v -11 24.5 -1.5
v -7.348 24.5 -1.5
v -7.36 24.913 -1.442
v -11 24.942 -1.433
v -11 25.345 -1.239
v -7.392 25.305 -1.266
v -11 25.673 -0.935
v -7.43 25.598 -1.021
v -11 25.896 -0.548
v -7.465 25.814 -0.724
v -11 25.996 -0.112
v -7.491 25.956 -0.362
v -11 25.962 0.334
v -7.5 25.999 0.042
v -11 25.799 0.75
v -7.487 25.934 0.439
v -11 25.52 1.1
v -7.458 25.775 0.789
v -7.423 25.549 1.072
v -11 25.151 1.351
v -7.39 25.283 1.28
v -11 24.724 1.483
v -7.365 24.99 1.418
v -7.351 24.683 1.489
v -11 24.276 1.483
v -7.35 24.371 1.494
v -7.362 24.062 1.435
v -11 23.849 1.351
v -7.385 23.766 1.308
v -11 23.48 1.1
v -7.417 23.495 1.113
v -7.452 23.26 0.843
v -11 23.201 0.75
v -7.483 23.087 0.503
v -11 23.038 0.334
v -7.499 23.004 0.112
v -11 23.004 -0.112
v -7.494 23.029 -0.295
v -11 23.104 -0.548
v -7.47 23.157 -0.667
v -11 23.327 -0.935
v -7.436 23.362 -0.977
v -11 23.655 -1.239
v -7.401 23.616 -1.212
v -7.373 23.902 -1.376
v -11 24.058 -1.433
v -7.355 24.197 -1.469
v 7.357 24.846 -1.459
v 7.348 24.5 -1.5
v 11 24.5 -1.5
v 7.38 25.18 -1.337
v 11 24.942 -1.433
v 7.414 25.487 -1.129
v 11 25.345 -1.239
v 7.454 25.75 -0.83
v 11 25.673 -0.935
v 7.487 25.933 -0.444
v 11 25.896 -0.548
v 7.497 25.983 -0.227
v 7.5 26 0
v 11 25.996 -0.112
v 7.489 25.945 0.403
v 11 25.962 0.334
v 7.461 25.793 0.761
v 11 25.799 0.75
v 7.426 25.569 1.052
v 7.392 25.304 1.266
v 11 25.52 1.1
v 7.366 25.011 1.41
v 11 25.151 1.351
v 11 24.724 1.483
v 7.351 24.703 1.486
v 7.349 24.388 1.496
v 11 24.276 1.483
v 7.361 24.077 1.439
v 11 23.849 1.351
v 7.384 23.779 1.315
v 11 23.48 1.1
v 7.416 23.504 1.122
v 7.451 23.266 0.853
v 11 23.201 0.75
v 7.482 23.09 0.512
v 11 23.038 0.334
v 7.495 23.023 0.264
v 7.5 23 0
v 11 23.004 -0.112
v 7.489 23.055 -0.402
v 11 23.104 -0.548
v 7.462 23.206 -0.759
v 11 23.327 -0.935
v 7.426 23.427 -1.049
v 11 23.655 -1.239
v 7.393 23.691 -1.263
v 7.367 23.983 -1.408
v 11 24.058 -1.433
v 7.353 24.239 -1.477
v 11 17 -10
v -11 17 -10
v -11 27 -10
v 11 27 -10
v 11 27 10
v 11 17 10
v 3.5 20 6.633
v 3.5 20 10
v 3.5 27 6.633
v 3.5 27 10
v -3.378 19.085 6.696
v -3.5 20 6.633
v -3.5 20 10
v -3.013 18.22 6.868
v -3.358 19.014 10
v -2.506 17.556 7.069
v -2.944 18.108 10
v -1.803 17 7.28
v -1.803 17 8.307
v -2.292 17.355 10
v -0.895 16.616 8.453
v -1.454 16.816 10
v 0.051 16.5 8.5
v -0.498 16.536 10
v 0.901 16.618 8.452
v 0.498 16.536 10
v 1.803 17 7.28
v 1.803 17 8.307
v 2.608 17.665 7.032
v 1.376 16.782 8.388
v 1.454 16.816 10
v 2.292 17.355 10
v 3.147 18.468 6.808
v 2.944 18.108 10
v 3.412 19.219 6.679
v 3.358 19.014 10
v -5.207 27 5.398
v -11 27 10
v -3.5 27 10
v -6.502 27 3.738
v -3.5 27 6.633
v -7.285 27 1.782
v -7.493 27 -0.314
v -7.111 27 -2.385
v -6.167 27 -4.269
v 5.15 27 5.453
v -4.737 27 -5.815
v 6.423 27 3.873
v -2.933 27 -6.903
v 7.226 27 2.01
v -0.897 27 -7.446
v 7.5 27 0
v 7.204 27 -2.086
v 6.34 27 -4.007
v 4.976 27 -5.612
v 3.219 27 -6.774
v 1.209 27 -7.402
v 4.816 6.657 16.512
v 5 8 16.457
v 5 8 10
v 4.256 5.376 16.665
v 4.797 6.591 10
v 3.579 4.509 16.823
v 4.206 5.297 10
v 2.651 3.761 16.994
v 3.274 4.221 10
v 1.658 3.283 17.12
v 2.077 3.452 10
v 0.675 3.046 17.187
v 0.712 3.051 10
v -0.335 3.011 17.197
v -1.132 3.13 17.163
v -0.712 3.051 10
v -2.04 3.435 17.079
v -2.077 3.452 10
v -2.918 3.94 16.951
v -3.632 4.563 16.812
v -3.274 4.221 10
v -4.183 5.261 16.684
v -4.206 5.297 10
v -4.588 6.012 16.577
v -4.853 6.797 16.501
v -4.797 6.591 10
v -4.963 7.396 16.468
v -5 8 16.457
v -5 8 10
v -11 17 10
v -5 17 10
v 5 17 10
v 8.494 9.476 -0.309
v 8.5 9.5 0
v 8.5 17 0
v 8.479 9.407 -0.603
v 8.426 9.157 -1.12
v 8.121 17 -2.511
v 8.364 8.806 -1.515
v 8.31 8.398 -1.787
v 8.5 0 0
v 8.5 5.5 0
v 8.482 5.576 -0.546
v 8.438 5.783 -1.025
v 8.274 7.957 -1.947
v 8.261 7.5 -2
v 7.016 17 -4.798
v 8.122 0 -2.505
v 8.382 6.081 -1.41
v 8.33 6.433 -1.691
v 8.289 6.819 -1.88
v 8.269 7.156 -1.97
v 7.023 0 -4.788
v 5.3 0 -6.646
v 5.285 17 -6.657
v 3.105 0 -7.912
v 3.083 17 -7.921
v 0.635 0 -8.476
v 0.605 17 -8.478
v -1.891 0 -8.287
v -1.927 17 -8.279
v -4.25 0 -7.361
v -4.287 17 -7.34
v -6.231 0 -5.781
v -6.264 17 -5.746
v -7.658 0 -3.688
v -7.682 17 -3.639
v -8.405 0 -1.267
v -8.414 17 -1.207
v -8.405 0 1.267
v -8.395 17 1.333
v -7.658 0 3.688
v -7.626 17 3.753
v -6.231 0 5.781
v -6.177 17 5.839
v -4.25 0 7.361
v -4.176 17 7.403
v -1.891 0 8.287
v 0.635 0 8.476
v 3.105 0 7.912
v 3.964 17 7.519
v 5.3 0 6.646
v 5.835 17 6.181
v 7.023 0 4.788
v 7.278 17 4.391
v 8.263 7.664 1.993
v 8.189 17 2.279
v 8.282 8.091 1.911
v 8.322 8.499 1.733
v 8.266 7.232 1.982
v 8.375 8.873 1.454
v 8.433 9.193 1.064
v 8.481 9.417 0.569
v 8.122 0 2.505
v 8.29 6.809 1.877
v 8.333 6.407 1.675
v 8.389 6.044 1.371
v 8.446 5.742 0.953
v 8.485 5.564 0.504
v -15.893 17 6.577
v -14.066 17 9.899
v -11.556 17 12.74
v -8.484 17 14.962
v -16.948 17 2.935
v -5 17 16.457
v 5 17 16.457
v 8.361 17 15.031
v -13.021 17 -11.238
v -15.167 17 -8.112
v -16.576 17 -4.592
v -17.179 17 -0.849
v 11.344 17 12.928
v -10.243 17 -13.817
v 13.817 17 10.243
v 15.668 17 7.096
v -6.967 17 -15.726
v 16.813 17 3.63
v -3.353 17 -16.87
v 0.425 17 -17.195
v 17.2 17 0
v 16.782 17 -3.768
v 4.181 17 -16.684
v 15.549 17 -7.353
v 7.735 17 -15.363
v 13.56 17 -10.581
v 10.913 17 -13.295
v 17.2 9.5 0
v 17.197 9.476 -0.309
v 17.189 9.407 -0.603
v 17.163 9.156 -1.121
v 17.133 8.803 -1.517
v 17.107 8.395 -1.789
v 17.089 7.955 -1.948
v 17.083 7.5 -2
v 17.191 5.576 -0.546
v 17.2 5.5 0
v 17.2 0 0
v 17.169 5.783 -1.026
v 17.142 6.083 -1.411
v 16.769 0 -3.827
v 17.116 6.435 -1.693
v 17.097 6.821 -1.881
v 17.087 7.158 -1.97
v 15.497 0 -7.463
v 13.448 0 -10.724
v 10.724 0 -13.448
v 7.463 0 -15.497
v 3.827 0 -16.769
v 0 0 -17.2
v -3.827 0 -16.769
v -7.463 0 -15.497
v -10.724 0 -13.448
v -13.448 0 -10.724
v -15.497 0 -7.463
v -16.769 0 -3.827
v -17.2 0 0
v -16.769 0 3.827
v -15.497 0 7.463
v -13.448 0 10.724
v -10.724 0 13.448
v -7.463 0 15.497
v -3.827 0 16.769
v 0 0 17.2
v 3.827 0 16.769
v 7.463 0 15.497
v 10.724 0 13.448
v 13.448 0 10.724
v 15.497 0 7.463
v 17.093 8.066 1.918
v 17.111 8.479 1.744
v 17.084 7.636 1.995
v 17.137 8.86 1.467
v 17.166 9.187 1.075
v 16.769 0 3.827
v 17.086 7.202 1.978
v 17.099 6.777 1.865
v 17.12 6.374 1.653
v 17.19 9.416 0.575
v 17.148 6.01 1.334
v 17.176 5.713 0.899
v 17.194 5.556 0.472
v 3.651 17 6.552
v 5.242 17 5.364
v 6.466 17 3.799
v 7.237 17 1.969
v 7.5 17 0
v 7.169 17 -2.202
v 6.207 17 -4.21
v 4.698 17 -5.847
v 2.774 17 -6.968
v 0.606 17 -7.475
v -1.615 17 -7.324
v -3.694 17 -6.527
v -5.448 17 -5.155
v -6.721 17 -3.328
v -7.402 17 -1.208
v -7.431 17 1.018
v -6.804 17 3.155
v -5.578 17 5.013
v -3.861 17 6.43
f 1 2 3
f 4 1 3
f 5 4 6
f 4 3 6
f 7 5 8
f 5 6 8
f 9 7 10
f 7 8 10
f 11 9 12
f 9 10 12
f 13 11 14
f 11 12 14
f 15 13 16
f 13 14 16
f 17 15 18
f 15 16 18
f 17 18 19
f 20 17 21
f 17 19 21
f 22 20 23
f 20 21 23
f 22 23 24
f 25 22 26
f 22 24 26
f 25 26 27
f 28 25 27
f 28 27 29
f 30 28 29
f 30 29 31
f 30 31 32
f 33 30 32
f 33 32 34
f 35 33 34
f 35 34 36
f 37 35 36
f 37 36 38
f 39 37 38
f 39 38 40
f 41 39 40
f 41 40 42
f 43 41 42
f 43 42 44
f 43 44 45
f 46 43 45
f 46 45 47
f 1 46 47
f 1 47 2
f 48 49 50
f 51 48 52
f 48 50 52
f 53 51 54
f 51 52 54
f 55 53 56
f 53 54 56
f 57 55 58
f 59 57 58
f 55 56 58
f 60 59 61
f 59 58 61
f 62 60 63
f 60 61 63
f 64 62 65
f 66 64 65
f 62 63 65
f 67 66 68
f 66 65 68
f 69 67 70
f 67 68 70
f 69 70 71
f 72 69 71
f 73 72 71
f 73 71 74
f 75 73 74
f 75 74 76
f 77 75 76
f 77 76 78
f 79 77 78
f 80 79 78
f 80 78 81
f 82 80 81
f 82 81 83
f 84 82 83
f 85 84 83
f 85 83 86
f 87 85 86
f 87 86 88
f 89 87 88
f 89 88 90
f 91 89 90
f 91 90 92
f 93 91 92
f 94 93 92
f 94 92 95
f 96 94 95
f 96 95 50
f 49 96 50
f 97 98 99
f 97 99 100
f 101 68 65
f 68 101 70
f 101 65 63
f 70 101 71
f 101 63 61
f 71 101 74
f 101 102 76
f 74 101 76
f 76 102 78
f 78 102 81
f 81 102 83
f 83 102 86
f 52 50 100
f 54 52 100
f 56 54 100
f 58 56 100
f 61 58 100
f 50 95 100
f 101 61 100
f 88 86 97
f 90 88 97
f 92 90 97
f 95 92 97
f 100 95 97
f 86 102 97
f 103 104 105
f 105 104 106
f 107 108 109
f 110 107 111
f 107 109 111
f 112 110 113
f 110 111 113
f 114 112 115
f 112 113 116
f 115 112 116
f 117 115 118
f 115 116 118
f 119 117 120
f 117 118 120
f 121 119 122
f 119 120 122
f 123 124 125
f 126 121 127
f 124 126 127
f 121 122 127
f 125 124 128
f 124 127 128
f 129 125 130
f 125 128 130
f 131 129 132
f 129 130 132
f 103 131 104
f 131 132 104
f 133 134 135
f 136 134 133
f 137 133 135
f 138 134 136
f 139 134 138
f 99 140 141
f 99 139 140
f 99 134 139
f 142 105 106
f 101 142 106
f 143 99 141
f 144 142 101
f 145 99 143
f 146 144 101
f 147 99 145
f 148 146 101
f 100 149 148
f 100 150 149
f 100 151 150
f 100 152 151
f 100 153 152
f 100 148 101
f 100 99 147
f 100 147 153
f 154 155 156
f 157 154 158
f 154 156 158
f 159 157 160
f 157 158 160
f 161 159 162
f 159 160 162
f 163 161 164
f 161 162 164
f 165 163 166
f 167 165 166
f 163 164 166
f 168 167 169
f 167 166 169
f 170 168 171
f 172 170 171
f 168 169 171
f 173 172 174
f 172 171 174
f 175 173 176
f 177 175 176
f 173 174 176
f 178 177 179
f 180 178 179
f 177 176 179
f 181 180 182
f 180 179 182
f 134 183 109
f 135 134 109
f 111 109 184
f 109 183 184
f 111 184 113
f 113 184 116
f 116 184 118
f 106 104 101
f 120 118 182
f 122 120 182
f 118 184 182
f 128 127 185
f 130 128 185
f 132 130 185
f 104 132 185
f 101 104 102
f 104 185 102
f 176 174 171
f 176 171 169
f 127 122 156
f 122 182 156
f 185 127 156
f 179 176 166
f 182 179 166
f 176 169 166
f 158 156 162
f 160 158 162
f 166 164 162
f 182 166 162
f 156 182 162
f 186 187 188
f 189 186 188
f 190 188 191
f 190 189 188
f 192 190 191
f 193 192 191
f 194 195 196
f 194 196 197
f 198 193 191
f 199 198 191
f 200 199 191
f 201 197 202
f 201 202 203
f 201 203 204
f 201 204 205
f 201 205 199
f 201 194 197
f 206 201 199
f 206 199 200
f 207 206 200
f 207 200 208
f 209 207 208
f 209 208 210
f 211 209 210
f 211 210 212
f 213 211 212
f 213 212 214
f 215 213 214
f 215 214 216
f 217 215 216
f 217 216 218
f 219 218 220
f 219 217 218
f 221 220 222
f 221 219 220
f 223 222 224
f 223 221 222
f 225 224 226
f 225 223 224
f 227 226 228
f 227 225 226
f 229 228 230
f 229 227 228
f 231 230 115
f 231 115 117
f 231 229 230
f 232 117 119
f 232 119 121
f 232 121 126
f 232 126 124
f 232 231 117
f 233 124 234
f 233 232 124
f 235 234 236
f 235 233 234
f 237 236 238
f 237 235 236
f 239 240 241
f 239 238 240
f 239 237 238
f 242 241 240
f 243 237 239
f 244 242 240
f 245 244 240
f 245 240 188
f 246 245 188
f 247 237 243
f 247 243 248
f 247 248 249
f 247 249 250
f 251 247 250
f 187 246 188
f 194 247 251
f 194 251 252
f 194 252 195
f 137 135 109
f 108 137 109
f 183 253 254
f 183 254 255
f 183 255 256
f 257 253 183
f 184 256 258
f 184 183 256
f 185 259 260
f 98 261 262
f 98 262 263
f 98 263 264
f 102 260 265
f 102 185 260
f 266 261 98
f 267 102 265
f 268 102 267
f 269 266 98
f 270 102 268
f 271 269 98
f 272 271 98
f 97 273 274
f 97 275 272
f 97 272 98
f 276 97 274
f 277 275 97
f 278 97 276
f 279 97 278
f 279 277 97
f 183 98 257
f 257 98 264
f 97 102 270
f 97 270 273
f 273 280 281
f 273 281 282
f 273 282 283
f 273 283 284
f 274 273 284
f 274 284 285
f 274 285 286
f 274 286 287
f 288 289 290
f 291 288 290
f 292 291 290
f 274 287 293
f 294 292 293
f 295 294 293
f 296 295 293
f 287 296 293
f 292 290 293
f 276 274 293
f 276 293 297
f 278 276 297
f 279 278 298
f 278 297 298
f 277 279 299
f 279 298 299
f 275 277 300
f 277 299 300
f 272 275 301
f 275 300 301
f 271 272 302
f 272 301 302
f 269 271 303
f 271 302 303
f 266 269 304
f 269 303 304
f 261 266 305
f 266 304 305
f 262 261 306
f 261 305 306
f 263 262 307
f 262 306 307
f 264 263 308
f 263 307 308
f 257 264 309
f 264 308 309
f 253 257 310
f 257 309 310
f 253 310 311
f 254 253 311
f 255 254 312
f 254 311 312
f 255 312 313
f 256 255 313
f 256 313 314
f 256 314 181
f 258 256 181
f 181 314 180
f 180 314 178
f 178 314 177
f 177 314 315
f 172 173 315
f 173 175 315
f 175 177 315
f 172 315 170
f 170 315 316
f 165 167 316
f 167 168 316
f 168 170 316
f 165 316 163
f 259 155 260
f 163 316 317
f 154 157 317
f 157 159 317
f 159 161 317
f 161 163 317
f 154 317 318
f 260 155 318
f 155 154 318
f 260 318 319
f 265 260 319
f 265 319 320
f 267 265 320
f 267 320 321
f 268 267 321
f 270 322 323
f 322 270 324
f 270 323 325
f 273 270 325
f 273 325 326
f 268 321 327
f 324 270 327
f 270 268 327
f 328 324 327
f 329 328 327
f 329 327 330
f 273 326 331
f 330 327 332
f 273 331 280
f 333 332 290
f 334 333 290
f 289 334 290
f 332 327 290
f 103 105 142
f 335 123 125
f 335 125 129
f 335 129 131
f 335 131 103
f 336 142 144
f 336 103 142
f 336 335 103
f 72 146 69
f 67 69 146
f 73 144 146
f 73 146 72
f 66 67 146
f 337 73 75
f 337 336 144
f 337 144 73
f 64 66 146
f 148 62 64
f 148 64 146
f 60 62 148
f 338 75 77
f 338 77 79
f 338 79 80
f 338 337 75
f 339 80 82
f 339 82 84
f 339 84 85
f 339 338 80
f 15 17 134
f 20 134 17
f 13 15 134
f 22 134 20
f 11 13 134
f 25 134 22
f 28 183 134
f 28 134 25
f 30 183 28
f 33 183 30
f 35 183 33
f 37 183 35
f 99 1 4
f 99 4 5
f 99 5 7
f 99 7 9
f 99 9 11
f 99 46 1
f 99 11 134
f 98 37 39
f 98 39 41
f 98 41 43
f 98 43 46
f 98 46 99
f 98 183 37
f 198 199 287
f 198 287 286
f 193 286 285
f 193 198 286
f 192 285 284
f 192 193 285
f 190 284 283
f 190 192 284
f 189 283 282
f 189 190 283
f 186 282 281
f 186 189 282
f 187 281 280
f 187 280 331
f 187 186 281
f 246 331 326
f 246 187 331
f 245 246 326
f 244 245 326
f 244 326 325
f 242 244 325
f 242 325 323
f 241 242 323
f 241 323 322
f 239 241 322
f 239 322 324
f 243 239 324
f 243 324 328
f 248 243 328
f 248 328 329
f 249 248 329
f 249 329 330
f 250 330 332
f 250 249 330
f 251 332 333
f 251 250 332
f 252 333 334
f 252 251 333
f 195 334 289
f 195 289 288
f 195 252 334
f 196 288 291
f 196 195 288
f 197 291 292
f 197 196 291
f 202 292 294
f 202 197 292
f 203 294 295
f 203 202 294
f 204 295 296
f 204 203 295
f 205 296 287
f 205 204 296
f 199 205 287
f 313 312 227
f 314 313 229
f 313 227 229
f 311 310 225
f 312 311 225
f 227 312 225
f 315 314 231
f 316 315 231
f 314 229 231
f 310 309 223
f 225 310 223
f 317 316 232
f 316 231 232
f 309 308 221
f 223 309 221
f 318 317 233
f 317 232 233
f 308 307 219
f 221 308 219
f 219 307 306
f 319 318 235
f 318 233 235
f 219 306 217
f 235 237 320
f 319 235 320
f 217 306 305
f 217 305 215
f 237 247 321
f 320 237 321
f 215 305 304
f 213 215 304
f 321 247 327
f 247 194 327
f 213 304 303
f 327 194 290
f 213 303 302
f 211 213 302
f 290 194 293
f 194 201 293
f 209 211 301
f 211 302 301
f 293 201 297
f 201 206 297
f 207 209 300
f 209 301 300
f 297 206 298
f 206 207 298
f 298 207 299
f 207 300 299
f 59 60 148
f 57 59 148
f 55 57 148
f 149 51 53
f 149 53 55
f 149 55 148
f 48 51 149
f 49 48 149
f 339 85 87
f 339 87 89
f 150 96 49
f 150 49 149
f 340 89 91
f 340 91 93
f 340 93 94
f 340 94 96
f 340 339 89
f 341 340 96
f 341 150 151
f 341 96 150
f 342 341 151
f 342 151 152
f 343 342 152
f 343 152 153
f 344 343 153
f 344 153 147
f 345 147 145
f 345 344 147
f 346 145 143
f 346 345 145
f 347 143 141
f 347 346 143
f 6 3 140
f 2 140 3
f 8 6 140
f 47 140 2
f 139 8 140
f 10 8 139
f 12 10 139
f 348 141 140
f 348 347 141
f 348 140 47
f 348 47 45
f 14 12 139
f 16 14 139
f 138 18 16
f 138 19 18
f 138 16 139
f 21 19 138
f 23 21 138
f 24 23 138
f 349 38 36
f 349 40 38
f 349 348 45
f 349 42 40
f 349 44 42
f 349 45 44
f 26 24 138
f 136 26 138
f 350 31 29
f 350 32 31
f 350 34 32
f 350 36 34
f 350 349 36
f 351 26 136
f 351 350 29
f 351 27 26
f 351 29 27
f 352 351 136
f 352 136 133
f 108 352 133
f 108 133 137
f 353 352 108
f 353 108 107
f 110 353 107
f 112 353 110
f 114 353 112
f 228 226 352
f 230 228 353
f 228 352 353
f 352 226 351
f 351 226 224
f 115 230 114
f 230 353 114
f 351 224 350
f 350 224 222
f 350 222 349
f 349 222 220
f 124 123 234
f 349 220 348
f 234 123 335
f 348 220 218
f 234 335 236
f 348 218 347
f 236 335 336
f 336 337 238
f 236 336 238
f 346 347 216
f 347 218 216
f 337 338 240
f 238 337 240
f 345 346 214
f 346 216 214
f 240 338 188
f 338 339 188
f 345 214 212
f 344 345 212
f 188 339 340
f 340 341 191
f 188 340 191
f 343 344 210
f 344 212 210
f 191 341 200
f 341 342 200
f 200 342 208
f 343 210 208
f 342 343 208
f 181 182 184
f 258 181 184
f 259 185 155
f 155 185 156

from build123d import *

# Parameters (mm, degrees)
SKETCH1_R           = 17.2
SKETCH1_R_2         = 8.5
BOSS_EXTRUDE1_DEPTH = 17
SKETCH2_W           = 22
SKETCH2_H           = 20
SKETCH2_R           = 7.5
BOSS_EXTRUDE2_DEPTH = 10
SKETCH3_R           = 1.5
CUT_EXTRUDE1_DEPTH  = 22
SKETCH4_R           = 2
CUT_EXTRUDE2_DEPTH  = 20
CUT_EXTRUDE3_DEPTH  = 20
CUT_EXTRUDE4_DEPTH  = 5


with BuildPart() as part:
    # Sketch1 → Boss-Extrude1 (new body)
    with BuildSketch(Plane(origin=(0, 0, 0), x_dir=(1, 0, 0), z_dir=(0, 1, 0))):
        Circle(SKETCH1_R)
        Circle(SKETCH1_R_2, mode=Mode.SUBTRACT)
    extrude(amount=BOSS_EXTRUDE1_DEPTH)

    # Sketch2 → Boss-Extrude2 (add)
    with BuildSketch(Plane(origin=(0, 17, 0), x_dir=(1, 0, 0), z_dir=(0, 1, 0))):
        Rectangle(SKETCH2_W, SKETCH2_H)
        Circle(SKETCH2_R, mode=Mode.SUBTRACT)
    extrude(amount=BOSS_EXTRUDE2_DEPTH)

    # Sketch3 → Cut-Extrude1 (cut)
    with BuildSketch(Plane(origin=(11, 0, 0), x_dir=(0, 0, -1), z_dir=(1, 0, 0))):
        with Locations((0, 24.5)):
            Circle(SKETCH3_R)
    extrude(amount=-CUT_EXTRUDE1_DEPTH, mode=Mode.SUBTRACT)

    # Sketch4 → Cut-Extrude2 (cut)
    with BuildSketch(Plane(origin=(0, 0, 0), x_dir=(0, 0, -1), z_dir=(1, 0, 0))):
        with Locations((0, 7.5)):
            Circle(SKETCH4_R)
    extrude(amount=CUT_EXTRUDE2_DEPTH, mode=Mode.SUBTRACT)

    # Sketch5 → Cut-Extrude3 (cut)
    with BuildSketch(Plane.XY.offset(10)):
        with BuildLine():
            Line((-5, 17), (5, 17))
            Line((5, 17), (5, 8))
            ThreePointArc((5, 8), (0, 3), (-5, 8))
            Line((-5, 8), (-5, 17))
        make_face()
    extrude(amount=CUT_EXTRUDE3_DEPTH, mode=Mode.SUBTRACT)

    # Sketch6 → Cut-Extrude4 (cut)
    with BuildSketch(Plane.XY.offset(10)):
        with BuildLine():
            Line((3.5, 27), (-3.5, 27))
            Line((-3.5, 27), (-3.5, 20))
            ThreePointArc((-3.5, 20), (0, 16.5), (3.5, 20))
            Line((3.5, 20), (3.5, 27))
        make_face()
    extrude(amount=-CUT_EXTRUDE4_DEPTH, mode=Mode.SUBTRACT)


solid = part.part
